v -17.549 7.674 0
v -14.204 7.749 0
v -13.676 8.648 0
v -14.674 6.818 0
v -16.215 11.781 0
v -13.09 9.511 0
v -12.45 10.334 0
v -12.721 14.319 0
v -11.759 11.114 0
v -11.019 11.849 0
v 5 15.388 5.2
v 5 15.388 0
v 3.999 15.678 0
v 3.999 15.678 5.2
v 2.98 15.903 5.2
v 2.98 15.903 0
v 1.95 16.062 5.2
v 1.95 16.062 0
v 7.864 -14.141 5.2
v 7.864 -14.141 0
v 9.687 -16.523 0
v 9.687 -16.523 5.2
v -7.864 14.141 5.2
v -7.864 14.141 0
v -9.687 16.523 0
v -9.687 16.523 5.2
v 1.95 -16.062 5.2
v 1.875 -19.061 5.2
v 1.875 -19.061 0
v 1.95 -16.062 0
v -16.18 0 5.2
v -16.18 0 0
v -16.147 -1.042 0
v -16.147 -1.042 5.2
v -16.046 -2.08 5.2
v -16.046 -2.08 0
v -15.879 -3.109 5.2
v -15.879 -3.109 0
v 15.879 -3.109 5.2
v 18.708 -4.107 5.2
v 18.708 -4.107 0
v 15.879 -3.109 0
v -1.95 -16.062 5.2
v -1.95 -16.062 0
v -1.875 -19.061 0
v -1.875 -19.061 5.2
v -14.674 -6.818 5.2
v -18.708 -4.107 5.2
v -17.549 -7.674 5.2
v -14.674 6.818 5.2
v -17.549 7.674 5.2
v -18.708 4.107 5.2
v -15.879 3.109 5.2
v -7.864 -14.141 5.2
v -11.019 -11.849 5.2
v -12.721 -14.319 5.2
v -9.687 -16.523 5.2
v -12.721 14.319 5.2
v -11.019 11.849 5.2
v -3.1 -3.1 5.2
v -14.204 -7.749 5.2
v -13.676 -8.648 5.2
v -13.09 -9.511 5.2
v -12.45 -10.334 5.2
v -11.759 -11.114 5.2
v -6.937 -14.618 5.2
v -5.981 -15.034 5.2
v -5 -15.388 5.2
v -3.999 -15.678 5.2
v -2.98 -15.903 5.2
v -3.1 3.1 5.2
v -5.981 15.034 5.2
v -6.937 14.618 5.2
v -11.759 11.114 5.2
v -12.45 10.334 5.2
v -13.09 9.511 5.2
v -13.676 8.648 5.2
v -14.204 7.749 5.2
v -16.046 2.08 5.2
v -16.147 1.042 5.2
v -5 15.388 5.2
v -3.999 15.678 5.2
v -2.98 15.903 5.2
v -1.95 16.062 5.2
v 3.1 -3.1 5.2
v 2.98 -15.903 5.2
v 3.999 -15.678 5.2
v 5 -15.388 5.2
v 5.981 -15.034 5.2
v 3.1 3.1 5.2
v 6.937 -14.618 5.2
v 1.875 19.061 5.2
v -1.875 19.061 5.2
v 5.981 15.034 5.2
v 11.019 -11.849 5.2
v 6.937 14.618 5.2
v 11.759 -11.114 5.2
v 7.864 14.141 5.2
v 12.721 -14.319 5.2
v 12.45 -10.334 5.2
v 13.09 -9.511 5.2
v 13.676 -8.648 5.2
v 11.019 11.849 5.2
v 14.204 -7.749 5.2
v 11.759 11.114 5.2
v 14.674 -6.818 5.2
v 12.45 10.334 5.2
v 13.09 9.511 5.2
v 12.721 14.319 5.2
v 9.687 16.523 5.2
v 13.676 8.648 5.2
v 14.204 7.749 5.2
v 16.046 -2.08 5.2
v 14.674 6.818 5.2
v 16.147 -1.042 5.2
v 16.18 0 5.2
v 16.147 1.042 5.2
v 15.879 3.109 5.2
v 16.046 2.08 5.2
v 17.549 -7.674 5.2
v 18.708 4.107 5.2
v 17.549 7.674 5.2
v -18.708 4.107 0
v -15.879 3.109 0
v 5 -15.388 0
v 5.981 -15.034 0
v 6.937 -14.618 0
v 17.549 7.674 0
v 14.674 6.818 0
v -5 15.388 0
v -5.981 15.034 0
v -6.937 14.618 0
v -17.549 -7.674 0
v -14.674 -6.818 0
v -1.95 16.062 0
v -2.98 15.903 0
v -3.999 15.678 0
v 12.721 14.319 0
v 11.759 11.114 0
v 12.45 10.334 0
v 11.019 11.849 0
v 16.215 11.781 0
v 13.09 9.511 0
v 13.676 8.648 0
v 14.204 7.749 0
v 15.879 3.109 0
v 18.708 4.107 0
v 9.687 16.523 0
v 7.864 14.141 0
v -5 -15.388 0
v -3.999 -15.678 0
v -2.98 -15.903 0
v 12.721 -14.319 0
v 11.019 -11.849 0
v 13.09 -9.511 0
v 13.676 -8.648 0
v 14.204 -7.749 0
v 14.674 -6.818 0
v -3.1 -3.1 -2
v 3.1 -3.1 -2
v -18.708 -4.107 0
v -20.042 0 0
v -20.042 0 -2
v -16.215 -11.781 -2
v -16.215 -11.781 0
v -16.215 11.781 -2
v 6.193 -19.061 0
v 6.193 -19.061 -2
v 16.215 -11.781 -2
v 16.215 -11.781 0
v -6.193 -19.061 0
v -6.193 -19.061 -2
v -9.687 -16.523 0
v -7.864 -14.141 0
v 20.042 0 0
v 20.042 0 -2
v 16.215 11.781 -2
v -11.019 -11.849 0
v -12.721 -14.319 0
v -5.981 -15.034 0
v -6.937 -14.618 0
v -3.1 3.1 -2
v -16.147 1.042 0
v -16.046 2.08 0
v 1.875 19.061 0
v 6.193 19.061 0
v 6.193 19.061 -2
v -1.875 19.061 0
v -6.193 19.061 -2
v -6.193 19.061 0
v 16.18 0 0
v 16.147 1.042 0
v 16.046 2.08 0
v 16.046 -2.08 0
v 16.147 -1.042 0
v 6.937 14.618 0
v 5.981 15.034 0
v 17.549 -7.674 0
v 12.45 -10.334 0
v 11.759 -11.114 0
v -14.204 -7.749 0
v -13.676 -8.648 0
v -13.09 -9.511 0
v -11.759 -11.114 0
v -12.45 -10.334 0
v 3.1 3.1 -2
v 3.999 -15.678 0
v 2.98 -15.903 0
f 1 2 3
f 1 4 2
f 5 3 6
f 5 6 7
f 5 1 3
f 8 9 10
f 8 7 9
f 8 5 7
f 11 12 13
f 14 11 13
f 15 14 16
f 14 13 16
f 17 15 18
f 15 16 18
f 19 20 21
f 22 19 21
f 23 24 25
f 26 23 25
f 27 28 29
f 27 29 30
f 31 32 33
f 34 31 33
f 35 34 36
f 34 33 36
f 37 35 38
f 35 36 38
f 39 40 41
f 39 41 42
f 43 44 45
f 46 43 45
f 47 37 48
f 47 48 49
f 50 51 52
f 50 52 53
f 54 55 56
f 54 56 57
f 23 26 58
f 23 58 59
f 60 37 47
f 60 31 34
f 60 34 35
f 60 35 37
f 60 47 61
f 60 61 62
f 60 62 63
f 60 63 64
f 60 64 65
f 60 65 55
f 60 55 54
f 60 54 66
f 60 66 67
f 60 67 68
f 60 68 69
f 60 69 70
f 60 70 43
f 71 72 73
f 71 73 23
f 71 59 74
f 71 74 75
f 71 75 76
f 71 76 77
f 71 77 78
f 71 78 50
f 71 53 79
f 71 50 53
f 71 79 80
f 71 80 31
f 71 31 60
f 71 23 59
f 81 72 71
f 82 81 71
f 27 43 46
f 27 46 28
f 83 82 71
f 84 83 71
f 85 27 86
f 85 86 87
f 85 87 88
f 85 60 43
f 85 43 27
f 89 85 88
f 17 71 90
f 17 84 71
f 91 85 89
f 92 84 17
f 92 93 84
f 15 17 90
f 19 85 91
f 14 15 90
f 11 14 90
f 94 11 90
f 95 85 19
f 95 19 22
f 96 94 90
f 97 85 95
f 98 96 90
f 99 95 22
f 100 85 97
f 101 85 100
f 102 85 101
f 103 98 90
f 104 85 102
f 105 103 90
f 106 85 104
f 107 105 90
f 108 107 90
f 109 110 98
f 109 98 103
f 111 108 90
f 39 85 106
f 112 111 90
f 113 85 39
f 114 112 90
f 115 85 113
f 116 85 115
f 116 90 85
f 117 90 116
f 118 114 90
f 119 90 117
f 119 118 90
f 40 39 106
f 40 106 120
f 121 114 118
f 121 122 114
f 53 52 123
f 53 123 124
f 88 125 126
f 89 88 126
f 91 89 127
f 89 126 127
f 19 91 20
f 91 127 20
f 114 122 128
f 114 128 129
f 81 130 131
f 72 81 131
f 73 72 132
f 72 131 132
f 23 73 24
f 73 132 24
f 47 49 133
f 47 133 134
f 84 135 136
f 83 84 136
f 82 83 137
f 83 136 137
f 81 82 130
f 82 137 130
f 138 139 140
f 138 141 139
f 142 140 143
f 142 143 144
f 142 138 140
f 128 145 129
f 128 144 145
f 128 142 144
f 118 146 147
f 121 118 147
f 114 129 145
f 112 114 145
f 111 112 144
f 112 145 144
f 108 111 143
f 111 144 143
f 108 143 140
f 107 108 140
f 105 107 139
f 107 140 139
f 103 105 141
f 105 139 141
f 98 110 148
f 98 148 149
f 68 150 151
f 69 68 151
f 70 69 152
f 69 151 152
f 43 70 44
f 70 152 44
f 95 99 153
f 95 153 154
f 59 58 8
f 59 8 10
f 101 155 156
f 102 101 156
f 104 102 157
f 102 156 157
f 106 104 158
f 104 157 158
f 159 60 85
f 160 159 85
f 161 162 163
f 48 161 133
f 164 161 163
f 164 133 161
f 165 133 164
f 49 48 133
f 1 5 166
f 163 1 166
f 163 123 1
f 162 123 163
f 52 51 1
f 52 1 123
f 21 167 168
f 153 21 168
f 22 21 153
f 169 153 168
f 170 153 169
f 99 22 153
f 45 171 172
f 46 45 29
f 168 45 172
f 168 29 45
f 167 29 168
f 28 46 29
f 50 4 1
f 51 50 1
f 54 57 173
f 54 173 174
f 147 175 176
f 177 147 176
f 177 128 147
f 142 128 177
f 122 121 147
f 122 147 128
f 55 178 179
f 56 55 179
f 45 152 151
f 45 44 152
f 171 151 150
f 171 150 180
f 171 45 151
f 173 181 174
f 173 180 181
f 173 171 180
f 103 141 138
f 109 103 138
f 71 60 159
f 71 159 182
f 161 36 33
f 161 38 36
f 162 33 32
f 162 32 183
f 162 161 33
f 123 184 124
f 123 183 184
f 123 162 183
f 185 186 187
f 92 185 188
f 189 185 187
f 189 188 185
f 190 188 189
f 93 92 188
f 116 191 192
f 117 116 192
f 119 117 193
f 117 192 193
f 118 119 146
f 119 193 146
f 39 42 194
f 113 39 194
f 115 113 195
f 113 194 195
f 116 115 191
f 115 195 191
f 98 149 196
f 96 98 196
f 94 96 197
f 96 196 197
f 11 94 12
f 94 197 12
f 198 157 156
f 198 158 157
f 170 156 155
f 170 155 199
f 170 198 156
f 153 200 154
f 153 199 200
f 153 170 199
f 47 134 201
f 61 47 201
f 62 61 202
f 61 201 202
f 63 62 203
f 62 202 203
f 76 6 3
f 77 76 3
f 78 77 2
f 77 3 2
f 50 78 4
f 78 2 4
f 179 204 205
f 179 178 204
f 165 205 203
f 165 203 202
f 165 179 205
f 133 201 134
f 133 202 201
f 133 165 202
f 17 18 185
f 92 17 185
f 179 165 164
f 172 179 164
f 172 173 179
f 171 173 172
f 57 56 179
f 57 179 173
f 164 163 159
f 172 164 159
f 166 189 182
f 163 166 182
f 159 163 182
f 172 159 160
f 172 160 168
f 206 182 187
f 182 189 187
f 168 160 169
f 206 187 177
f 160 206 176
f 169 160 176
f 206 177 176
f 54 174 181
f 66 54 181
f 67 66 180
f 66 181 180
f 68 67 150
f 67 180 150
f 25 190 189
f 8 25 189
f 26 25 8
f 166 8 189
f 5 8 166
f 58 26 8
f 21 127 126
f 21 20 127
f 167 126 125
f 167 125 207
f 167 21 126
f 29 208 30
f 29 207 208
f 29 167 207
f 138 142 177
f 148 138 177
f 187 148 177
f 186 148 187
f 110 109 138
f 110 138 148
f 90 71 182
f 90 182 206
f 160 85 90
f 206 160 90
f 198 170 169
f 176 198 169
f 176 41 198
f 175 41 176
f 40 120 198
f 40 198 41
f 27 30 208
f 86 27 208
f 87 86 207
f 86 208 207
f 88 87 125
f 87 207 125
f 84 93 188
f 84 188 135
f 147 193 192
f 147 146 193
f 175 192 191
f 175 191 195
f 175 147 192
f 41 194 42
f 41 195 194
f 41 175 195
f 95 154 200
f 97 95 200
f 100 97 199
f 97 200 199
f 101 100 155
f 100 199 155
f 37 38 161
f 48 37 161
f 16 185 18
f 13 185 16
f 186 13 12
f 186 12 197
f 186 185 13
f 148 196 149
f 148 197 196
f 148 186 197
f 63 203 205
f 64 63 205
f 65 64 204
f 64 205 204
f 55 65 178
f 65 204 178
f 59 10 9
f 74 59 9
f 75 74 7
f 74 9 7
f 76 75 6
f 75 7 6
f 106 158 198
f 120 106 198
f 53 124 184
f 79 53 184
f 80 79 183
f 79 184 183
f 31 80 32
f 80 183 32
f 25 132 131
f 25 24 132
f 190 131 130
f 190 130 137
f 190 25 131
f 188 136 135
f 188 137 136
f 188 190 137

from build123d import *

# Parameters (mm, degrees)
BOSS_EXTRU_1_DEPTH           = 5.2
BOSS_EXTRU_2_DEPTH           = 2
R_P_TITION_CIRCULAIRE1_COUNT = 10
ESQUISSE2_W                  = 6.2
ESQUISSE2_H                  = 6.2
ENL_V_MAT_EXTRU_1_DEPTH      = 8.2


with BuildPart() as part:
    # Esquisse1 → Boss.-Extru.1 (new body)
    with BuildSketch(Plane.XY):
        with BuildLine():
            Line((-5, 15.388417686), (0, 0))
            Line((0, 0), (5, 15.388417686))
            ThreePointArc((5, 15.388417686), (3.491302077, 15.799183798), (1.95, 16.062406385))
            Line((1.95, 16.062406385), (1.875, 19.061468738))
            Line((1.875, 19.061468738), (-1.875, 19.061468738))
            Line((-1.875, 19.061468738), (-1.95, 16.062406385))
            ThreePointArc((-1.95, 16.062406385), (-3.491302077, 15.799183798), (-5, 15.388417686))
        make_face()
    boss_extru_1 = extrude(amount=BOSS_EXTRU_1_DEPTH)

    # Esquisse4 → Boss.-Extru.2 (add)
    with BuildSketch(Plane(origin=(0, 0, 0), x_dir=(-1, 0, 0), z_dir=(0, 0, -1))):
        Polygon((0, 0), (-6.193446632, 19.061468738), (6.193446632, 19.061468738), align=None)
    boss_extru_2 = extrude(amount=BOSS_EXTRU_2_DEPTH)

    # Répétition circulaire1: Boss.-Extru.1, Boss.-Extru.2 ×10 about axis
    r_p_tition_circulaire1_axis = Axis((0, 0, 0), (0, 0, 1))
    for i in range(1, R_P_TITION_CIRCULAIRE1_COUNT):
        add(boss_extru_1.rotate(r_p_tition_circulaire1_axis, i * 360 / R_P_TITION_CIRCULAIRE1_COUNT))
        add(boss_extru_2.rotate(r_p_tition_circulaire1_axis, i * 360 / R_P_TITION_CIRCULAIRE1_COUNT))

    # Esquisse2 → Enlèv. mat.-Extru.1 (cut, through all)
    with BuildSketch(Plane.XY.offset(5.2)):
        Rectangle(ESQUISSE2_W, ESQUISSE2_H)
    extrude(amount=-ENL_V_MAT_EXTRU_1_DEPTH, mode=Mode.SUBTRACT)


solid = part.part
